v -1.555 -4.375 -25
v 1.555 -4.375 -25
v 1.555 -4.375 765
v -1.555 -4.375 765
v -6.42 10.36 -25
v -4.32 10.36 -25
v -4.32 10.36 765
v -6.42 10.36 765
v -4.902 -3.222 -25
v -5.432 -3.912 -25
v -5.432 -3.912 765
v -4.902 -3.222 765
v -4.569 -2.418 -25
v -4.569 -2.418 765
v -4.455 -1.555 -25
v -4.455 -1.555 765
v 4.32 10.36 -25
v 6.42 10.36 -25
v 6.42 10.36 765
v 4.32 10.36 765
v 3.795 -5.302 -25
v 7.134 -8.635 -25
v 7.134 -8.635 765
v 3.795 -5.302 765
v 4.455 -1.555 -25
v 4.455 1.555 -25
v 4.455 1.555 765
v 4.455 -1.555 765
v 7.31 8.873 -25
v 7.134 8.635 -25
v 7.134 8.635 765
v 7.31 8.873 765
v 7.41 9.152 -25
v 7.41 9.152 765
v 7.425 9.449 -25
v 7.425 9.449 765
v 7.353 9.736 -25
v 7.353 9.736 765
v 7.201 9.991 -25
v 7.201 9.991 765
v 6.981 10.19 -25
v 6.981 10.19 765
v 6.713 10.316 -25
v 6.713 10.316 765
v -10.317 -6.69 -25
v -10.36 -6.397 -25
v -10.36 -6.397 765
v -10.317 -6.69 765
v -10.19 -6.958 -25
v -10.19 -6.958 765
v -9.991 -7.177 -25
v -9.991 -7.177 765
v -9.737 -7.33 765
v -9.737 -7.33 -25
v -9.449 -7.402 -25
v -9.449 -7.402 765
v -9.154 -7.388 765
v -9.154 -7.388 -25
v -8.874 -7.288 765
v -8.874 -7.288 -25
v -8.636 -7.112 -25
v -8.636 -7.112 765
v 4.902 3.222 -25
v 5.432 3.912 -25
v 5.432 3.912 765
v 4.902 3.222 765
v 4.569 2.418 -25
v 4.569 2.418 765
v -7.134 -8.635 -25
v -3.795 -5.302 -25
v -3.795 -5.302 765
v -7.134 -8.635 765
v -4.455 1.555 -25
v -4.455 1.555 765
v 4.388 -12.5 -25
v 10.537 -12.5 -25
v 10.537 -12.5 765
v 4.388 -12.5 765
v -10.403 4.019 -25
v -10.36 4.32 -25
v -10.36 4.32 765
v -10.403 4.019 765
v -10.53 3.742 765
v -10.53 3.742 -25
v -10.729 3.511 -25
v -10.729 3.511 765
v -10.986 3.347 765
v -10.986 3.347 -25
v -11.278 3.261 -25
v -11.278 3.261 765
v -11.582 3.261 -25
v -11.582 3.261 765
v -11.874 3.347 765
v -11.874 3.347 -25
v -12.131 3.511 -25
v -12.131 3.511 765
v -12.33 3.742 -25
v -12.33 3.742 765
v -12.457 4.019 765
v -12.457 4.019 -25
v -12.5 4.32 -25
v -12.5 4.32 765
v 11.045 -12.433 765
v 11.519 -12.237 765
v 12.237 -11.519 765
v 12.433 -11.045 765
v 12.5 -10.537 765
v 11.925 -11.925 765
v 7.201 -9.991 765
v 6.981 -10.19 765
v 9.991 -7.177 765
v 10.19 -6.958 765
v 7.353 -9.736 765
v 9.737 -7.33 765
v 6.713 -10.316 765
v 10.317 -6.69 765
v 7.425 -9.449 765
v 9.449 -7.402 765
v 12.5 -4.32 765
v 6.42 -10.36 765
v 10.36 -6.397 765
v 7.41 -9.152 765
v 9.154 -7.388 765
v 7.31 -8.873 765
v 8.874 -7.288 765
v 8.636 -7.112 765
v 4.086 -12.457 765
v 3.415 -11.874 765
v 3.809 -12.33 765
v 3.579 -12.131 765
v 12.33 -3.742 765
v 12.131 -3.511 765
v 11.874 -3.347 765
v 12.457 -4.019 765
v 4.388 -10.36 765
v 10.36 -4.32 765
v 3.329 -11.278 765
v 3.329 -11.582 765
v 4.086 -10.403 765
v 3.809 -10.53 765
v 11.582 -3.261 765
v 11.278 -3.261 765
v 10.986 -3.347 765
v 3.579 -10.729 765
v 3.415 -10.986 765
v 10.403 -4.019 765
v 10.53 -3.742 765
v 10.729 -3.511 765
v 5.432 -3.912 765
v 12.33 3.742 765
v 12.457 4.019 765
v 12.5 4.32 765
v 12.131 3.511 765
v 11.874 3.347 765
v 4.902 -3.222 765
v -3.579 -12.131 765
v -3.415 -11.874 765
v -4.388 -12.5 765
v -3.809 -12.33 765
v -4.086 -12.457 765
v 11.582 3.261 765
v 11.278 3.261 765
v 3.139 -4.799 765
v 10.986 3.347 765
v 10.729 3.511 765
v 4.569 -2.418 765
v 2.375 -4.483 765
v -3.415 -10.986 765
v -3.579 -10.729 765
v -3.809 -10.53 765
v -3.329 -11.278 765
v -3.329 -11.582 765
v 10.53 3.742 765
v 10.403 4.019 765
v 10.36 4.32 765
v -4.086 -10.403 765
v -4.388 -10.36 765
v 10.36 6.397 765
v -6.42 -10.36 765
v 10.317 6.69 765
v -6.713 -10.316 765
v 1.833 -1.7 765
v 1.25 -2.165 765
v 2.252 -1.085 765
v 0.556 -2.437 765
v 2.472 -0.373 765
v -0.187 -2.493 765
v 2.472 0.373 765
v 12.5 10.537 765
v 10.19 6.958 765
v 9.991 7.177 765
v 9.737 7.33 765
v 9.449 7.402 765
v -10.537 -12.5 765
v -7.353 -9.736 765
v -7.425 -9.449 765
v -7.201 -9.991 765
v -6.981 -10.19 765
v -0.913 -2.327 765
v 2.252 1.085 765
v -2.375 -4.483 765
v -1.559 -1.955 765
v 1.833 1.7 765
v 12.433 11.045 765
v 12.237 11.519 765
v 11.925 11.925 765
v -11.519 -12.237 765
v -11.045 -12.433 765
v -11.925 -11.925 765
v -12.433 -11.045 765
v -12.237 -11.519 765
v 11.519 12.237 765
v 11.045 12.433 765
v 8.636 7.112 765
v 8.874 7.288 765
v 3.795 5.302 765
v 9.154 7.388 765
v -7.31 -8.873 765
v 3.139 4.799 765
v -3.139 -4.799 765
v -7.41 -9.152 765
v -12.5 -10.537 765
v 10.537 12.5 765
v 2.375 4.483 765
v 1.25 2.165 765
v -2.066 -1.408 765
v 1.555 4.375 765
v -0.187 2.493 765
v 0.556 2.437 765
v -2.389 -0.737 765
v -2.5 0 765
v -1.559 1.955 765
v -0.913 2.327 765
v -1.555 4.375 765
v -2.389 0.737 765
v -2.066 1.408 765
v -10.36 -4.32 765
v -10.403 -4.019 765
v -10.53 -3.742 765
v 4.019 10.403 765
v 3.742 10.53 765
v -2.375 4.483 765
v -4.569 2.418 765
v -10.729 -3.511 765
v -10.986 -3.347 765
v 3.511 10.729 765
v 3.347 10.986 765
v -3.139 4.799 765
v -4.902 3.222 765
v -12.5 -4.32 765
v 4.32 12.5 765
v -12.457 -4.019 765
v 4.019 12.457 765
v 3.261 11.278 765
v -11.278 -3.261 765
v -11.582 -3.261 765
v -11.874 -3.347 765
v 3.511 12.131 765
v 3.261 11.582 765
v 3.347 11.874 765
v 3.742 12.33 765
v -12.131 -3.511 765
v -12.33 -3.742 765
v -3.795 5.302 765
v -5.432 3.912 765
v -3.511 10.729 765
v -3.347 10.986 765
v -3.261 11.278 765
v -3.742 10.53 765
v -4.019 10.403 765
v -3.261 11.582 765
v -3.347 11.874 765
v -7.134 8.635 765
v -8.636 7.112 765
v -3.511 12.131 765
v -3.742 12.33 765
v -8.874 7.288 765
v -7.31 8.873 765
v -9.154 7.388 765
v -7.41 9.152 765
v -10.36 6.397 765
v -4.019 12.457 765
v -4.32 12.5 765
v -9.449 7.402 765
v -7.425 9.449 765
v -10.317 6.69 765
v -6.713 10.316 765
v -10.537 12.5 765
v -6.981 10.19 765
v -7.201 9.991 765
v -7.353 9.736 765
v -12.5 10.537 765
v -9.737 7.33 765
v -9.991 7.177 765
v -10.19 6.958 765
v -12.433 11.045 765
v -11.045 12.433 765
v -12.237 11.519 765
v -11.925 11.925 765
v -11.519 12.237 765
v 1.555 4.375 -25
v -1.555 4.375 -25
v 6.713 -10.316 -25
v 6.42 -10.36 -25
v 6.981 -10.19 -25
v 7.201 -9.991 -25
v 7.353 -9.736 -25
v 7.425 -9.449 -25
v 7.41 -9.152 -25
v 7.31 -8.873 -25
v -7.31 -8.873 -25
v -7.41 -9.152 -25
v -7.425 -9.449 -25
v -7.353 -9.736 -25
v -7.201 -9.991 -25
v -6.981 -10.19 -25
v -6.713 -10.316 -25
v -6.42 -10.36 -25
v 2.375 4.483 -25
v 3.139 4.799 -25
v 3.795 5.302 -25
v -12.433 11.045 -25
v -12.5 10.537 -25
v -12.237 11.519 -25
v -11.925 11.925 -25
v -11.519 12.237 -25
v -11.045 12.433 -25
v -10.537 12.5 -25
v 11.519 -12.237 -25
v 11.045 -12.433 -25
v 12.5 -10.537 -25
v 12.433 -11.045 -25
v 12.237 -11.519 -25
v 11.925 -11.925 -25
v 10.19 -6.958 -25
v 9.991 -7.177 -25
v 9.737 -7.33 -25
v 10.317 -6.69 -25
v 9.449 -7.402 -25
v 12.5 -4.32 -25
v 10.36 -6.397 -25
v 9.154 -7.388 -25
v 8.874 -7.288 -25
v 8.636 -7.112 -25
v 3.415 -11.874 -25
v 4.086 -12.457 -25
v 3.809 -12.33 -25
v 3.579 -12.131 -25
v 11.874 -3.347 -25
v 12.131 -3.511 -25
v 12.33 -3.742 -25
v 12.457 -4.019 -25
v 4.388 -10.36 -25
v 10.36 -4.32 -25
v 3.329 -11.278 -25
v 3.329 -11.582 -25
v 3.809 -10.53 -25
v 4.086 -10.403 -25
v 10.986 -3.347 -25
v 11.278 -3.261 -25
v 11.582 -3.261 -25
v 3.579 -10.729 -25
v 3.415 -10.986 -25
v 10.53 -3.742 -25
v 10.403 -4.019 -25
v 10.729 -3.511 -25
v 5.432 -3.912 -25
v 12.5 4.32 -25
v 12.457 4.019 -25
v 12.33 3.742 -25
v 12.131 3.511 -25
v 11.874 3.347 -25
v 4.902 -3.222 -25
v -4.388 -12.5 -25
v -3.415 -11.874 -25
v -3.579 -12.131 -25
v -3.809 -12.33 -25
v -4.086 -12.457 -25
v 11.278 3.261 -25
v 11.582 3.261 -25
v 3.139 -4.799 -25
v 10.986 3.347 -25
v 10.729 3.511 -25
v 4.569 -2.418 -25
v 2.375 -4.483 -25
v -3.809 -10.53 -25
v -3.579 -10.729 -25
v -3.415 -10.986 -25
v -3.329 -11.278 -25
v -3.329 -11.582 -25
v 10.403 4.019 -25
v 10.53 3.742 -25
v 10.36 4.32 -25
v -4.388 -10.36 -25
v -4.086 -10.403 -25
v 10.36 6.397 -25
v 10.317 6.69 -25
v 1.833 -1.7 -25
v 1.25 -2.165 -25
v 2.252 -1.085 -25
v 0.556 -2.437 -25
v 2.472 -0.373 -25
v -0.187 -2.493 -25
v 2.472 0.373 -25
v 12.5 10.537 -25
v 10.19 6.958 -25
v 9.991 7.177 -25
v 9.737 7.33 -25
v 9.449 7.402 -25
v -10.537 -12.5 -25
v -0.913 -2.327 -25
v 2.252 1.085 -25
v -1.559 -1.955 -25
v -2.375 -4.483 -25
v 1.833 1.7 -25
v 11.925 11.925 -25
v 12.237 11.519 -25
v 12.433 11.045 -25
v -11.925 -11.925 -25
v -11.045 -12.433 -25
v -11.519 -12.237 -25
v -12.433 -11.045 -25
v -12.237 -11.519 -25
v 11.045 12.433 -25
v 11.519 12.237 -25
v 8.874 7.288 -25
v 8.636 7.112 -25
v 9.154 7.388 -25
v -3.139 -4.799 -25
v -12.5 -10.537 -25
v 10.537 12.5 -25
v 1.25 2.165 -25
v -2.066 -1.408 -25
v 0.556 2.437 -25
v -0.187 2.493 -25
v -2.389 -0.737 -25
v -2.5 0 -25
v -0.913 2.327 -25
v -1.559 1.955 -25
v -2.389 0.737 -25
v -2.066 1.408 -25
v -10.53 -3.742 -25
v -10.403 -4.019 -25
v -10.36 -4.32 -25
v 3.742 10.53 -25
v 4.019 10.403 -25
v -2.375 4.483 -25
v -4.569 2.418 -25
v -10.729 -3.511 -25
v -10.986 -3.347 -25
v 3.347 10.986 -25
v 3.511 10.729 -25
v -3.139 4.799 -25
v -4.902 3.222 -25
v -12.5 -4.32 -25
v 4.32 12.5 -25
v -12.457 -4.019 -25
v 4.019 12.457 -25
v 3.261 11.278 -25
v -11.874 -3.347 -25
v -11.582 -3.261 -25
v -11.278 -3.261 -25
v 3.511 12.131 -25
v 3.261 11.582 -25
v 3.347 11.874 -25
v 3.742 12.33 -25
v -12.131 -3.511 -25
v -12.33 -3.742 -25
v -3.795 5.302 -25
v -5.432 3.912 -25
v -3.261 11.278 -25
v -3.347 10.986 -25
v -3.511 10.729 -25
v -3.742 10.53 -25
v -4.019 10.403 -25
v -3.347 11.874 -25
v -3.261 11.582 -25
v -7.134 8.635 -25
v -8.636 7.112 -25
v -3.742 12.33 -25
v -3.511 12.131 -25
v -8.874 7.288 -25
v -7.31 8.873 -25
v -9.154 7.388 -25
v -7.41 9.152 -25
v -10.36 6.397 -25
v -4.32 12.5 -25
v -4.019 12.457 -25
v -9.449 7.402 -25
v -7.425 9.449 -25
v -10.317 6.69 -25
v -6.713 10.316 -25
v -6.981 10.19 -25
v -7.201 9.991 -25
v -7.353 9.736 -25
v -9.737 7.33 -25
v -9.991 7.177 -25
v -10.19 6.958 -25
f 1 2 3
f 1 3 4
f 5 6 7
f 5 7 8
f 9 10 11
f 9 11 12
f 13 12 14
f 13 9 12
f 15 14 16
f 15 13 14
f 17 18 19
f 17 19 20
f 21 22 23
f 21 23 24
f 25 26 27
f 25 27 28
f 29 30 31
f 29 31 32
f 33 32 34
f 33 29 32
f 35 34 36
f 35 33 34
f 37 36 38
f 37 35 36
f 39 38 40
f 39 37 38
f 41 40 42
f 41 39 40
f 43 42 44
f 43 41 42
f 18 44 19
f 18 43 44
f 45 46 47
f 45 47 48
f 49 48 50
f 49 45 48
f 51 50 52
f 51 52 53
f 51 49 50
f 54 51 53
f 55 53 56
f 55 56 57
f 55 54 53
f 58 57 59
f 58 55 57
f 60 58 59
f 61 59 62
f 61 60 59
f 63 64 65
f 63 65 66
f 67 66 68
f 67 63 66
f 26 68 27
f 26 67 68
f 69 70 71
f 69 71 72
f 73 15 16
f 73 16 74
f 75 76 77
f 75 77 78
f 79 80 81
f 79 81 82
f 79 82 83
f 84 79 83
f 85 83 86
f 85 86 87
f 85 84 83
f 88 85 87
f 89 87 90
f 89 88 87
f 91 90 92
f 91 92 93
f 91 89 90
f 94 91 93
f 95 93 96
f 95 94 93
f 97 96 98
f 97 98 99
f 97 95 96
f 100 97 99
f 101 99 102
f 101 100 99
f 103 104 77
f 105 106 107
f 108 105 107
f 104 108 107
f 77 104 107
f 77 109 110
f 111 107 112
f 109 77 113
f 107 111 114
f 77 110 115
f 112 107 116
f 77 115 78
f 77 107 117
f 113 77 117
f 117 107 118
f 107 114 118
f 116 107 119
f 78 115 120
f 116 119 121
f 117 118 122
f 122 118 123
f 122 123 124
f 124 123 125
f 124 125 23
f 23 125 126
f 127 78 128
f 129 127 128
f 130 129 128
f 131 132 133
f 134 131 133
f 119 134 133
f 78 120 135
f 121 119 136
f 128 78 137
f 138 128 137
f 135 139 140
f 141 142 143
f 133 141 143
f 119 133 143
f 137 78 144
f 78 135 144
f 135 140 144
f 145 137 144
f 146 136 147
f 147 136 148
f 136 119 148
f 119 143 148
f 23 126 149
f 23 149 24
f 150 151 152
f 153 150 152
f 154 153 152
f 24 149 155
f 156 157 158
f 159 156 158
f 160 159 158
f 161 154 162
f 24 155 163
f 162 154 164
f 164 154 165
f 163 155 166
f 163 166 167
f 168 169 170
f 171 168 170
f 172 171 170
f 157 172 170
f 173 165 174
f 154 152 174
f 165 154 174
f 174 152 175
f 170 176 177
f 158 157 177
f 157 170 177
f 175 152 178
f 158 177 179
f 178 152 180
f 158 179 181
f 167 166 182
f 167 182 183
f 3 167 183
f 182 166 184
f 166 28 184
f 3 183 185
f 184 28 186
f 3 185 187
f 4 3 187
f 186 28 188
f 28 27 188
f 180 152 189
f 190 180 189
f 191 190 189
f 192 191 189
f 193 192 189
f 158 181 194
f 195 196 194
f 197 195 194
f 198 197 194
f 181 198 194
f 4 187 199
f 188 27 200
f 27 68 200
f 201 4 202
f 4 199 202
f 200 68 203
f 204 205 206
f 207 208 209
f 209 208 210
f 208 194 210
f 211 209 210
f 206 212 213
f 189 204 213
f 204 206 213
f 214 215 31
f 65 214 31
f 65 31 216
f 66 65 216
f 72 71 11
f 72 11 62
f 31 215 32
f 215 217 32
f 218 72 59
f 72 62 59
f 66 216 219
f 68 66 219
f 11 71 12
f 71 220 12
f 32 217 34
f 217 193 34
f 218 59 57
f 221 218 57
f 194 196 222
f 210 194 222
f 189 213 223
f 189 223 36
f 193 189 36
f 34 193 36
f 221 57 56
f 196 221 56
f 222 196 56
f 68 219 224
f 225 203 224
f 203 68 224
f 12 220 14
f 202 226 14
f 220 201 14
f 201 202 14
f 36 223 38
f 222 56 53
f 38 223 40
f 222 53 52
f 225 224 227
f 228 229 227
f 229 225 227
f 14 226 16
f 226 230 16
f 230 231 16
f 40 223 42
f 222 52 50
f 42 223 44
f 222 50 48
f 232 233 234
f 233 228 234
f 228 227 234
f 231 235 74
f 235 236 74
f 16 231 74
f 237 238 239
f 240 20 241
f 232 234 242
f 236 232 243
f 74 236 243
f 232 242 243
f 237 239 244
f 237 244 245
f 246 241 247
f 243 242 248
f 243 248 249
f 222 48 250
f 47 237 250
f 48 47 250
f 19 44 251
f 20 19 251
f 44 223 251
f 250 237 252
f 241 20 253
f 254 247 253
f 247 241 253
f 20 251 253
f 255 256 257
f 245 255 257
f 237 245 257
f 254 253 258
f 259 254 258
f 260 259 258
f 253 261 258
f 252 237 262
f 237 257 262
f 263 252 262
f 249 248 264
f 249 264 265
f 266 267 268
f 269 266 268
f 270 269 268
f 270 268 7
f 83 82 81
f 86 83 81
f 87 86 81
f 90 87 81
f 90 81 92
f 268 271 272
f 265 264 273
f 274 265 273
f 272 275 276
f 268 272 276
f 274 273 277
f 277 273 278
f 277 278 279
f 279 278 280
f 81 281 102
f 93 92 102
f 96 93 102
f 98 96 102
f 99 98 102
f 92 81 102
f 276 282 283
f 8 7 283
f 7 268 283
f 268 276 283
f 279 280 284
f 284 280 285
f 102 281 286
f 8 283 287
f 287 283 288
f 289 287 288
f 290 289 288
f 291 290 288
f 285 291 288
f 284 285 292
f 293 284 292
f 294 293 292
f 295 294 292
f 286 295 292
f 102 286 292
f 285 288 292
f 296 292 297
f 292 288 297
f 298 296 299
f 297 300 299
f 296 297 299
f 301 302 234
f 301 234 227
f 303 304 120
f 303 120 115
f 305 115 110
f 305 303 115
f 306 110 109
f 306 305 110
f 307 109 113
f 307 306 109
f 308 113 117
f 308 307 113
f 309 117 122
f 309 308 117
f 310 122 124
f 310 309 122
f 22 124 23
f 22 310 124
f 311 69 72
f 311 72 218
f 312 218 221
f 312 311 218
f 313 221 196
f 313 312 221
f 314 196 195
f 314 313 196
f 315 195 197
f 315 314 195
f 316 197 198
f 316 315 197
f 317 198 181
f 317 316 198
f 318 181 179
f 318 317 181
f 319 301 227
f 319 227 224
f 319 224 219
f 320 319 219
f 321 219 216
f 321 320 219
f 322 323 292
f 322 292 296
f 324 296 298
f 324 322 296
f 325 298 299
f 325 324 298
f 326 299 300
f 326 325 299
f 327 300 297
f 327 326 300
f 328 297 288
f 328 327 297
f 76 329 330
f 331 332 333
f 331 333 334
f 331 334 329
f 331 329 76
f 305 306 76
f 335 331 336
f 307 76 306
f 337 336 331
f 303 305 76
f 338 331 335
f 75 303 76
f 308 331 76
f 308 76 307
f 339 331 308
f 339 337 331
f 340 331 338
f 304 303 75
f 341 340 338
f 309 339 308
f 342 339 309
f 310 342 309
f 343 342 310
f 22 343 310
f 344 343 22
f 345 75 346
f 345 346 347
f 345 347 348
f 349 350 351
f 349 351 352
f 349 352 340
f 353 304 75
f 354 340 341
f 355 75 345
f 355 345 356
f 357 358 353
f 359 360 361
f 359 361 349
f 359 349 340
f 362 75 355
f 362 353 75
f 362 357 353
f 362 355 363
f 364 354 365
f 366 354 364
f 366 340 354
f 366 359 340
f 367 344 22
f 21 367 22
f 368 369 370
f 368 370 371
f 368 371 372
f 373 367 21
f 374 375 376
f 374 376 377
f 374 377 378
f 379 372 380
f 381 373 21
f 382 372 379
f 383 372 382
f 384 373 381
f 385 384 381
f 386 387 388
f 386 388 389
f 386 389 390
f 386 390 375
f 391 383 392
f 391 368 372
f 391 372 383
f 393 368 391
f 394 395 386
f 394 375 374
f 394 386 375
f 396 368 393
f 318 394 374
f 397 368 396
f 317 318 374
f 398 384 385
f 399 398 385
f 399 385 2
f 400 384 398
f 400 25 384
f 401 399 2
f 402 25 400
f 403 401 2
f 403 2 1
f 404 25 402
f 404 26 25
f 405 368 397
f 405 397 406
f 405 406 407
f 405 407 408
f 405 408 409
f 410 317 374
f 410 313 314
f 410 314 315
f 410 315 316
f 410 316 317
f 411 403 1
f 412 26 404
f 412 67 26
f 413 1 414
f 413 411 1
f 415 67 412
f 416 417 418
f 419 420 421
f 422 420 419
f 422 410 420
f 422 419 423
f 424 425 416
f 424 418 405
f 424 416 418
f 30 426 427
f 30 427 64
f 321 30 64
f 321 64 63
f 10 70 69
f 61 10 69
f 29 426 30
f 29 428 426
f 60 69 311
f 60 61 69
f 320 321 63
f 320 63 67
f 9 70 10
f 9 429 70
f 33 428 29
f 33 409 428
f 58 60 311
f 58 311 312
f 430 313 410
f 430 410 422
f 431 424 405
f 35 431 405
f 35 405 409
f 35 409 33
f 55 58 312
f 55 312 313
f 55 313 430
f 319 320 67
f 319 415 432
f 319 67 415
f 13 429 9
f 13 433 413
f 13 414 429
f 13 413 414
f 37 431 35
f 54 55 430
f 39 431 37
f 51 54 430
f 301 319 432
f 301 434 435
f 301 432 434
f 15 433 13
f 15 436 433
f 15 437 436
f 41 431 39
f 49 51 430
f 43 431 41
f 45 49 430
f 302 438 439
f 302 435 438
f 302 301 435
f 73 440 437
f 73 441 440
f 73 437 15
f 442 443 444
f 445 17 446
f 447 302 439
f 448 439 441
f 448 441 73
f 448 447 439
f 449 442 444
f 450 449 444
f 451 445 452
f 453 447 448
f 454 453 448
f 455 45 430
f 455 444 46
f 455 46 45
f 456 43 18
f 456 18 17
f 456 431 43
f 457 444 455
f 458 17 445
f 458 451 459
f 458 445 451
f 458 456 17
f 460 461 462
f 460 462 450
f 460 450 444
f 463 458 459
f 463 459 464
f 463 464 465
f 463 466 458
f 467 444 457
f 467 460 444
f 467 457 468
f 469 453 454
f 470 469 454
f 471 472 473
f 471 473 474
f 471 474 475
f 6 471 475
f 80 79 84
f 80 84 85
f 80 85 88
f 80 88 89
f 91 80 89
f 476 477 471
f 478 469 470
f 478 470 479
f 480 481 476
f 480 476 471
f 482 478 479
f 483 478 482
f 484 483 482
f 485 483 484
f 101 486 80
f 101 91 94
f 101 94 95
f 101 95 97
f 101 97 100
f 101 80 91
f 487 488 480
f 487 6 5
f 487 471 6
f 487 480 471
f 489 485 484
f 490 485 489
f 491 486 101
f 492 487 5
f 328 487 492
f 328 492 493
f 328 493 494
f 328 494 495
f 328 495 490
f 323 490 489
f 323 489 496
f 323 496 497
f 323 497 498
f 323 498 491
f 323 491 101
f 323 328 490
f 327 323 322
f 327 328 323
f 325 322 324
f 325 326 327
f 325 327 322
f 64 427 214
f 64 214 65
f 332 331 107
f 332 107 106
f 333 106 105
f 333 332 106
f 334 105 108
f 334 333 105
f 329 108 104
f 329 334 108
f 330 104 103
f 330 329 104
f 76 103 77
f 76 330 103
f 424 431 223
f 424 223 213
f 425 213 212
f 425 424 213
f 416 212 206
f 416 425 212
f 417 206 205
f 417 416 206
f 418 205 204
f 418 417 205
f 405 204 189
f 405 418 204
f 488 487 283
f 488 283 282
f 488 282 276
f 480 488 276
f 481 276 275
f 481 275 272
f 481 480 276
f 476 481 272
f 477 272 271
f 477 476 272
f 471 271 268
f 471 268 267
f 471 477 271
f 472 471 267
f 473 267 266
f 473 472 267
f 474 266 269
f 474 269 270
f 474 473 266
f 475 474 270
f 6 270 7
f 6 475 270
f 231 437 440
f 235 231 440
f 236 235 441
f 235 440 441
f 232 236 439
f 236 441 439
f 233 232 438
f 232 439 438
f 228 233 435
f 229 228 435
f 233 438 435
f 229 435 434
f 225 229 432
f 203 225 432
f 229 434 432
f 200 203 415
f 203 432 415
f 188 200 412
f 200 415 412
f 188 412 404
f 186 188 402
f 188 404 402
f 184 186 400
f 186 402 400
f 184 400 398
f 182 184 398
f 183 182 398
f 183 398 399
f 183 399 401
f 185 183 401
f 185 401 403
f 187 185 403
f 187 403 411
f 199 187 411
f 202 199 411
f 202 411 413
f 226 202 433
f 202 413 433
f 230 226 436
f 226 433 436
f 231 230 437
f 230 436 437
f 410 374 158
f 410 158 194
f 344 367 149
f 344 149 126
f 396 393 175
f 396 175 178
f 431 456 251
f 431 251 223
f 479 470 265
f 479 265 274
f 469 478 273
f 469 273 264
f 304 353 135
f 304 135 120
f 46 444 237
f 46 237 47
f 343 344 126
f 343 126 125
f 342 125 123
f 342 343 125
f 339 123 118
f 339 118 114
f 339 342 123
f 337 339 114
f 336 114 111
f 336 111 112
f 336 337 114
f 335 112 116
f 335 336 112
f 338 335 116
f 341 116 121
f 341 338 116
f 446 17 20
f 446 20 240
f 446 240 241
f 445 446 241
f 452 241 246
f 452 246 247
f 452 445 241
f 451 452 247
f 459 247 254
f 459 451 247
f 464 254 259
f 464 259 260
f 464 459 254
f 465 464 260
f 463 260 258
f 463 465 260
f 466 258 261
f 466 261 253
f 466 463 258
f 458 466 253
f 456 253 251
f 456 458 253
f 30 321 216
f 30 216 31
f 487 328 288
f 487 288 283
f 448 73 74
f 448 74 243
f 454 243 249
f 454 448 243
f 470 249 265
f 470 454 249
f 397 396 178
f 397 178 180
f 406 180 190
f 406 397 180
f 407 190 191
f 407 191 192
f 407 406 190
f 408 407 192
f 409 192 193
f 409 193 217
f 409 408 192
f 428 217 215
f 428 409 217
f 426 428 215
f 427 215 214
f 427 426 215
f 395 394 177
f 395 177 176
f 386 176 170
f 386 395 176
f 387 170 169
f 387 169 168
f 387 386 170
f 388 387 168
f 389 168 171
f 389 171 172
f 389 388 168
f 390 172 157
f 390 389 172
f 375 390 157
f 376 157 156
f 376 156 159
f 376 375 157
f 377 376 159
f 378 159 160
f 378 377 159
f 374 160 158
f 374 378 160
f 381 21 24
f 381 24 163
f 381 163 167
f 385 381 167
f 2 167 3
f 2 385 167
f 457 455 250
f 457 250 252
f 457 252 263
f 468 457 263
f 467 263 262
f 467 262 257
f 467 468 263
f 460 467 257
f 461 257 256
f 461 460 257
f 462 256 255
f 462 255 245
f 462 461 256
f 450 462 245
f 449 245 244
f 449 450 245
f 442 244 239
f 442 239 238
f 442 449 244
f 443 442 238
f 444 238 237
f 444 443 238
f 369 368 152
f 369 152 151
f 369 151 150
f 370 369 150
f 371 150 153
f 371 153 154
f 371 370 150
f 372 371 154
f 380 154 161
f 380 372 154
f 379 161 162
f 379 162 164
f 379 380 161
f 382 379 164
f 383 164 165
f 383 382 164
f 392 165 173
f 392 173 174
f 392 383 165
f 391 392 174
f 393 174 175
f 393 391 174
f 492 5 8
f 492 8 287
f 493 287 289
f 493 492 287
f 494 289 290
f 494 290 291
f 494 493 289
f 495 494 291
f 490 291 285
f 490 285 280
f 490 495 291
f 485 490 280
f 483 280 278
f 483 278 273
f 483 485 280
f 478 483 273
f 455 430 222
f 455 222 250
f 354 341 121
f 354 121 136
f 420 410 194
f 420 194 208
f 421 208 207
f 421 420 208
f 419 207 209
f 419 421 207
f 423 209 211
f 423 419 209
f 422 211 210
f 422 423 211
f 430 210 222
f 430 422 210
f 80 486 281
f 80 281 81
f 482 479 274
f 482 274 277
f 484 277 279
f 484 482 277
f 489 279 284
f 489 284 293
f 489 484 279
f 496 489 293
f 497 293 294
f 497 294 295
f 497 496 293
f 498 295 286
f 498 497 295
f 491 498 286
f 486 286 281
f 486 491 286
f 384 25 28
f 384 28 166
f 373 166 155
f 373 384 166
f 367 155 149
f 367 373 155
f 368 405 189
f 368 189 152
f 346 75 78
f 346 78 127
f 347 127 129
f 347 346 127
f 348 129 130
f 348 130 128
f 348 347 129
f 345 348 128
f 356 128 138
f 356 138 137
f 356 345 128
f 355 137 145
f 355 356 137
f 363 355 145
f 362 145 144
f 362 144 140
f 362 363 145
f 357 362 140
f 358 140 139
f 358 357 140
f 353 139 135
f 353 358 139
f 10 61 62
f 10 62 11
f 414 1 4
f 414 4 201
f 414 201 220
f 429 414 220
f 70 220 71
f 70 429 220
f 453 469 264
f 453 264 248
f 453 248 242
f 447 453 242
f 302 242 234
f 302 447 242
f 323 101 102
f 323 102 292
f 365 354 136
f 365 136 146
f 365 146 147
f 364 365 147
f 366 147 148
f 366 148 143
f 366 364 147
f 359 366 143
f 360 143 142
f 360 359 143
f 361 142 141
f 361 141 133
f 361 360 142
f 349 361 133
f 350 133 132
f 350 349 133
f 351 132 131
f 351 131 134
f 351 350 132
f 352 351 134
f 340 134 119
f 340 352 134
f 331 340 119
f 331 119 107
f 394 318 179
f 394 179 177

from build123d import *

# Parameters (mm, degrees)
SKETCH1_R           = 2.5
BOSS_EXTRUDE1_DEPTH = 790


with BuildPart() as part:
    # Sketch1 → Boss-Extrude1 (new body)
    with BuildSketch(Plane(origin=(0, 0, -25), x_dir=(-1, 0, 0), z_dir=(0, 0, -1))):
        with BuildLine():
            Line((12.5, 4.32), (12.5, 10.537068835))
            ThreePointArc((12.5, 10.537068835), (11.925070773, 11.925070773), (10.537068835, 12.5))
            Line((10.537068835, 12.5), (4.32, 12.5))
            ThreePointArc((4.32, 12.5), (3.25, 11.43), (4.32, 10.36))
            Line((4.32, 10.36), (6.42, 10.36))
            ThreePointArc((6.42, 10.36), (7.35325999, 9.736168088), (7.133653911, 8.635298598))
            Line((7.133653911, 8.635298598), (3.795290766, 5.301828272))
            ThreePointArc((3.795290766, 5.301828272), (2.76743922, 4.61585726), (1.555406707, 4.375))
            Line((1.555406707, 4.375), (-1.555406707, 4.375))
            ThreePointArc((-1.555406707, 4.375), (-2.76743922, 4.61585726), (-3.795290766, 5.301828272))
            Line((-3.795290766, 5.301828272), (-7.133653912, 8.635298598))
            ThreePointArc((-7.133653912, 8.635298598), (-7.35325999, 9.736168088), (-6.42, 10.36))
            Line((-6.42, 10.36), (-4.32, 10.36))
            ThreePointArc((-4.32, 10.36), (-3.25, 11.43), (-4.32, 12.5))
            Line((-4.32, 12.5), (-10.537068835, 12.5))
            ThreePointArc((-10.537068835, 12.5), (-11.925070773, 11.925070773), (-12.5, 10.537068835))
            Line((-12.5, 10.537068835), (-12.5, 4.32))
            ThreePointArc((-12.5, 4.32), (-11.43, 3.25), (-10.36, 4.32))
            Line((-10.36, 4.32), (-10.36, 6.396886949))
            ThreePointArc((-10.36, 6.396886949), (-9.736852394, 7.329863489), (-8.636346088, 7.111588351))
            Line((-8.636346088, 7.111588351), (-5.432204773, 3.912143135))
            ThreePointArc((-5.432204773, 3.912143135), (-4.708985779, 2.831057106), (-4.455, 1.555406707))
            Line((-4.455, 1.555406707), (-4.455, -1.555406707))
            ThreePointArc((-4.455, -1.555406707), (-4.708985779, -2.831057106), (-5.432204773, -3.912143135))
            Line((-5.432204773, -3.912143135), (-8.636346088, -7.111588351))
            ThreePointArc((-8.636346088, -7.111588351), (-9.736852394, -7.329863489), (-10.36, -6.396886949))
            Line((-10.36, -6.396886949), (-10.36, -4.32))
            ThreePointArc((-10.36, -4.32), (-11.43, -3.25), (-12.5, -4.32))
            Line((-12.5, -4.32), (-12.5, -10.537068835))
            ThreePointArc((-12.5, -10.537068835), (-11.925070773, -11.925070773), (-10.537068835, -12.5))
            Line((-10.537068835, -12.5), (-4.387856959, -12.5))
            ThreePointArc((-4.387856959, -12.5), (-3.317856959, -11.43), (-4.387856959, -10.36))
            Line((-4.387856959, -10.36), (-6.42, -10.36))
            ThreePointArc((-6.42, -10.36), (-7.35325999, -9.736168088), (-7.133653912, -8.635298598))
            Line((-7.133653912, -8.635298598), (-3.795290766, -5.301828272))
            ThreePointArc((-3.795290766, -5.301828272), (-2.76743922, -4.61585726), (-1.555406707, -4.375))
            Line((-1.555406707, -4.375), (1.555406707, -4.375))
            ThreePointArc((1.555406707, -4.375), (2.76743922, -4.61585726), (3.795290766, -5.301828272))
            Line((3.795290766, -5.301828272), (7.133653912, -8.635298598))
            ThreePointArc((7.133653912, -8.635298598), (7.35325999, -9.736168088), (6.42, -10.36))
            Line((6.42, -10.36), (4.387856959, -10.36))
            ThreePointArc((4.387856959, -10.36), (3.317856959, -11.43), (4.387856959, -12.5))
            Line((4.387856959, -12.5), (10.537068835, -12.5))
            ThreePointArc((10.537068835, -12.5), (11.925070773, -11.925070773), (12.5, -10.537068835))
            Line((12.5, -10.537068835), (12.5, -4.32))
            ThreePointArc((12.5, -4.32), (11.43, -3.25), (10.36, -4.32))
            Line((10.36, -4.32), (10.36, -6.396886949))
            ThreePointArc((10.36, -6.396886949), (9.736852394, -7.329863489), (8.636346088, -7.111588351))
            Line((8.636346088, -7.111588351), (5.432204773, -3.912143135))
            ThreePointArc((5.432204773, -3.912143135), (4.708985779, -2.831057106), (4.455, -1.555406707))
            Line((4.455, -1.555406707), (4.455, 1.555406707))
            ThreePointArc((4.455, 1.555406707), (4.708985779, 2.831057106), (5.432204773, 3.912143135))
            Line((5.432204773, 3.912143135), (8.636346088, 7.111588351))
            ThreePointArc((8.636346088, 7.111588351), (9.736852394, 7.329863489), (10.36, 6.396886949))
            Line((10.36, 6.396886949), (10.36, 4.32))
            ThreePointArc((10.36, 4.32), (11.43, 3.25), (12.5, 4.32))
        make_face()
        Circle(SKETCH1_R, mode=Mode.SUBTRACT)
    extrude(amount=-BOSS_EXTRUDE1_DEPTH)


solid = part.part
